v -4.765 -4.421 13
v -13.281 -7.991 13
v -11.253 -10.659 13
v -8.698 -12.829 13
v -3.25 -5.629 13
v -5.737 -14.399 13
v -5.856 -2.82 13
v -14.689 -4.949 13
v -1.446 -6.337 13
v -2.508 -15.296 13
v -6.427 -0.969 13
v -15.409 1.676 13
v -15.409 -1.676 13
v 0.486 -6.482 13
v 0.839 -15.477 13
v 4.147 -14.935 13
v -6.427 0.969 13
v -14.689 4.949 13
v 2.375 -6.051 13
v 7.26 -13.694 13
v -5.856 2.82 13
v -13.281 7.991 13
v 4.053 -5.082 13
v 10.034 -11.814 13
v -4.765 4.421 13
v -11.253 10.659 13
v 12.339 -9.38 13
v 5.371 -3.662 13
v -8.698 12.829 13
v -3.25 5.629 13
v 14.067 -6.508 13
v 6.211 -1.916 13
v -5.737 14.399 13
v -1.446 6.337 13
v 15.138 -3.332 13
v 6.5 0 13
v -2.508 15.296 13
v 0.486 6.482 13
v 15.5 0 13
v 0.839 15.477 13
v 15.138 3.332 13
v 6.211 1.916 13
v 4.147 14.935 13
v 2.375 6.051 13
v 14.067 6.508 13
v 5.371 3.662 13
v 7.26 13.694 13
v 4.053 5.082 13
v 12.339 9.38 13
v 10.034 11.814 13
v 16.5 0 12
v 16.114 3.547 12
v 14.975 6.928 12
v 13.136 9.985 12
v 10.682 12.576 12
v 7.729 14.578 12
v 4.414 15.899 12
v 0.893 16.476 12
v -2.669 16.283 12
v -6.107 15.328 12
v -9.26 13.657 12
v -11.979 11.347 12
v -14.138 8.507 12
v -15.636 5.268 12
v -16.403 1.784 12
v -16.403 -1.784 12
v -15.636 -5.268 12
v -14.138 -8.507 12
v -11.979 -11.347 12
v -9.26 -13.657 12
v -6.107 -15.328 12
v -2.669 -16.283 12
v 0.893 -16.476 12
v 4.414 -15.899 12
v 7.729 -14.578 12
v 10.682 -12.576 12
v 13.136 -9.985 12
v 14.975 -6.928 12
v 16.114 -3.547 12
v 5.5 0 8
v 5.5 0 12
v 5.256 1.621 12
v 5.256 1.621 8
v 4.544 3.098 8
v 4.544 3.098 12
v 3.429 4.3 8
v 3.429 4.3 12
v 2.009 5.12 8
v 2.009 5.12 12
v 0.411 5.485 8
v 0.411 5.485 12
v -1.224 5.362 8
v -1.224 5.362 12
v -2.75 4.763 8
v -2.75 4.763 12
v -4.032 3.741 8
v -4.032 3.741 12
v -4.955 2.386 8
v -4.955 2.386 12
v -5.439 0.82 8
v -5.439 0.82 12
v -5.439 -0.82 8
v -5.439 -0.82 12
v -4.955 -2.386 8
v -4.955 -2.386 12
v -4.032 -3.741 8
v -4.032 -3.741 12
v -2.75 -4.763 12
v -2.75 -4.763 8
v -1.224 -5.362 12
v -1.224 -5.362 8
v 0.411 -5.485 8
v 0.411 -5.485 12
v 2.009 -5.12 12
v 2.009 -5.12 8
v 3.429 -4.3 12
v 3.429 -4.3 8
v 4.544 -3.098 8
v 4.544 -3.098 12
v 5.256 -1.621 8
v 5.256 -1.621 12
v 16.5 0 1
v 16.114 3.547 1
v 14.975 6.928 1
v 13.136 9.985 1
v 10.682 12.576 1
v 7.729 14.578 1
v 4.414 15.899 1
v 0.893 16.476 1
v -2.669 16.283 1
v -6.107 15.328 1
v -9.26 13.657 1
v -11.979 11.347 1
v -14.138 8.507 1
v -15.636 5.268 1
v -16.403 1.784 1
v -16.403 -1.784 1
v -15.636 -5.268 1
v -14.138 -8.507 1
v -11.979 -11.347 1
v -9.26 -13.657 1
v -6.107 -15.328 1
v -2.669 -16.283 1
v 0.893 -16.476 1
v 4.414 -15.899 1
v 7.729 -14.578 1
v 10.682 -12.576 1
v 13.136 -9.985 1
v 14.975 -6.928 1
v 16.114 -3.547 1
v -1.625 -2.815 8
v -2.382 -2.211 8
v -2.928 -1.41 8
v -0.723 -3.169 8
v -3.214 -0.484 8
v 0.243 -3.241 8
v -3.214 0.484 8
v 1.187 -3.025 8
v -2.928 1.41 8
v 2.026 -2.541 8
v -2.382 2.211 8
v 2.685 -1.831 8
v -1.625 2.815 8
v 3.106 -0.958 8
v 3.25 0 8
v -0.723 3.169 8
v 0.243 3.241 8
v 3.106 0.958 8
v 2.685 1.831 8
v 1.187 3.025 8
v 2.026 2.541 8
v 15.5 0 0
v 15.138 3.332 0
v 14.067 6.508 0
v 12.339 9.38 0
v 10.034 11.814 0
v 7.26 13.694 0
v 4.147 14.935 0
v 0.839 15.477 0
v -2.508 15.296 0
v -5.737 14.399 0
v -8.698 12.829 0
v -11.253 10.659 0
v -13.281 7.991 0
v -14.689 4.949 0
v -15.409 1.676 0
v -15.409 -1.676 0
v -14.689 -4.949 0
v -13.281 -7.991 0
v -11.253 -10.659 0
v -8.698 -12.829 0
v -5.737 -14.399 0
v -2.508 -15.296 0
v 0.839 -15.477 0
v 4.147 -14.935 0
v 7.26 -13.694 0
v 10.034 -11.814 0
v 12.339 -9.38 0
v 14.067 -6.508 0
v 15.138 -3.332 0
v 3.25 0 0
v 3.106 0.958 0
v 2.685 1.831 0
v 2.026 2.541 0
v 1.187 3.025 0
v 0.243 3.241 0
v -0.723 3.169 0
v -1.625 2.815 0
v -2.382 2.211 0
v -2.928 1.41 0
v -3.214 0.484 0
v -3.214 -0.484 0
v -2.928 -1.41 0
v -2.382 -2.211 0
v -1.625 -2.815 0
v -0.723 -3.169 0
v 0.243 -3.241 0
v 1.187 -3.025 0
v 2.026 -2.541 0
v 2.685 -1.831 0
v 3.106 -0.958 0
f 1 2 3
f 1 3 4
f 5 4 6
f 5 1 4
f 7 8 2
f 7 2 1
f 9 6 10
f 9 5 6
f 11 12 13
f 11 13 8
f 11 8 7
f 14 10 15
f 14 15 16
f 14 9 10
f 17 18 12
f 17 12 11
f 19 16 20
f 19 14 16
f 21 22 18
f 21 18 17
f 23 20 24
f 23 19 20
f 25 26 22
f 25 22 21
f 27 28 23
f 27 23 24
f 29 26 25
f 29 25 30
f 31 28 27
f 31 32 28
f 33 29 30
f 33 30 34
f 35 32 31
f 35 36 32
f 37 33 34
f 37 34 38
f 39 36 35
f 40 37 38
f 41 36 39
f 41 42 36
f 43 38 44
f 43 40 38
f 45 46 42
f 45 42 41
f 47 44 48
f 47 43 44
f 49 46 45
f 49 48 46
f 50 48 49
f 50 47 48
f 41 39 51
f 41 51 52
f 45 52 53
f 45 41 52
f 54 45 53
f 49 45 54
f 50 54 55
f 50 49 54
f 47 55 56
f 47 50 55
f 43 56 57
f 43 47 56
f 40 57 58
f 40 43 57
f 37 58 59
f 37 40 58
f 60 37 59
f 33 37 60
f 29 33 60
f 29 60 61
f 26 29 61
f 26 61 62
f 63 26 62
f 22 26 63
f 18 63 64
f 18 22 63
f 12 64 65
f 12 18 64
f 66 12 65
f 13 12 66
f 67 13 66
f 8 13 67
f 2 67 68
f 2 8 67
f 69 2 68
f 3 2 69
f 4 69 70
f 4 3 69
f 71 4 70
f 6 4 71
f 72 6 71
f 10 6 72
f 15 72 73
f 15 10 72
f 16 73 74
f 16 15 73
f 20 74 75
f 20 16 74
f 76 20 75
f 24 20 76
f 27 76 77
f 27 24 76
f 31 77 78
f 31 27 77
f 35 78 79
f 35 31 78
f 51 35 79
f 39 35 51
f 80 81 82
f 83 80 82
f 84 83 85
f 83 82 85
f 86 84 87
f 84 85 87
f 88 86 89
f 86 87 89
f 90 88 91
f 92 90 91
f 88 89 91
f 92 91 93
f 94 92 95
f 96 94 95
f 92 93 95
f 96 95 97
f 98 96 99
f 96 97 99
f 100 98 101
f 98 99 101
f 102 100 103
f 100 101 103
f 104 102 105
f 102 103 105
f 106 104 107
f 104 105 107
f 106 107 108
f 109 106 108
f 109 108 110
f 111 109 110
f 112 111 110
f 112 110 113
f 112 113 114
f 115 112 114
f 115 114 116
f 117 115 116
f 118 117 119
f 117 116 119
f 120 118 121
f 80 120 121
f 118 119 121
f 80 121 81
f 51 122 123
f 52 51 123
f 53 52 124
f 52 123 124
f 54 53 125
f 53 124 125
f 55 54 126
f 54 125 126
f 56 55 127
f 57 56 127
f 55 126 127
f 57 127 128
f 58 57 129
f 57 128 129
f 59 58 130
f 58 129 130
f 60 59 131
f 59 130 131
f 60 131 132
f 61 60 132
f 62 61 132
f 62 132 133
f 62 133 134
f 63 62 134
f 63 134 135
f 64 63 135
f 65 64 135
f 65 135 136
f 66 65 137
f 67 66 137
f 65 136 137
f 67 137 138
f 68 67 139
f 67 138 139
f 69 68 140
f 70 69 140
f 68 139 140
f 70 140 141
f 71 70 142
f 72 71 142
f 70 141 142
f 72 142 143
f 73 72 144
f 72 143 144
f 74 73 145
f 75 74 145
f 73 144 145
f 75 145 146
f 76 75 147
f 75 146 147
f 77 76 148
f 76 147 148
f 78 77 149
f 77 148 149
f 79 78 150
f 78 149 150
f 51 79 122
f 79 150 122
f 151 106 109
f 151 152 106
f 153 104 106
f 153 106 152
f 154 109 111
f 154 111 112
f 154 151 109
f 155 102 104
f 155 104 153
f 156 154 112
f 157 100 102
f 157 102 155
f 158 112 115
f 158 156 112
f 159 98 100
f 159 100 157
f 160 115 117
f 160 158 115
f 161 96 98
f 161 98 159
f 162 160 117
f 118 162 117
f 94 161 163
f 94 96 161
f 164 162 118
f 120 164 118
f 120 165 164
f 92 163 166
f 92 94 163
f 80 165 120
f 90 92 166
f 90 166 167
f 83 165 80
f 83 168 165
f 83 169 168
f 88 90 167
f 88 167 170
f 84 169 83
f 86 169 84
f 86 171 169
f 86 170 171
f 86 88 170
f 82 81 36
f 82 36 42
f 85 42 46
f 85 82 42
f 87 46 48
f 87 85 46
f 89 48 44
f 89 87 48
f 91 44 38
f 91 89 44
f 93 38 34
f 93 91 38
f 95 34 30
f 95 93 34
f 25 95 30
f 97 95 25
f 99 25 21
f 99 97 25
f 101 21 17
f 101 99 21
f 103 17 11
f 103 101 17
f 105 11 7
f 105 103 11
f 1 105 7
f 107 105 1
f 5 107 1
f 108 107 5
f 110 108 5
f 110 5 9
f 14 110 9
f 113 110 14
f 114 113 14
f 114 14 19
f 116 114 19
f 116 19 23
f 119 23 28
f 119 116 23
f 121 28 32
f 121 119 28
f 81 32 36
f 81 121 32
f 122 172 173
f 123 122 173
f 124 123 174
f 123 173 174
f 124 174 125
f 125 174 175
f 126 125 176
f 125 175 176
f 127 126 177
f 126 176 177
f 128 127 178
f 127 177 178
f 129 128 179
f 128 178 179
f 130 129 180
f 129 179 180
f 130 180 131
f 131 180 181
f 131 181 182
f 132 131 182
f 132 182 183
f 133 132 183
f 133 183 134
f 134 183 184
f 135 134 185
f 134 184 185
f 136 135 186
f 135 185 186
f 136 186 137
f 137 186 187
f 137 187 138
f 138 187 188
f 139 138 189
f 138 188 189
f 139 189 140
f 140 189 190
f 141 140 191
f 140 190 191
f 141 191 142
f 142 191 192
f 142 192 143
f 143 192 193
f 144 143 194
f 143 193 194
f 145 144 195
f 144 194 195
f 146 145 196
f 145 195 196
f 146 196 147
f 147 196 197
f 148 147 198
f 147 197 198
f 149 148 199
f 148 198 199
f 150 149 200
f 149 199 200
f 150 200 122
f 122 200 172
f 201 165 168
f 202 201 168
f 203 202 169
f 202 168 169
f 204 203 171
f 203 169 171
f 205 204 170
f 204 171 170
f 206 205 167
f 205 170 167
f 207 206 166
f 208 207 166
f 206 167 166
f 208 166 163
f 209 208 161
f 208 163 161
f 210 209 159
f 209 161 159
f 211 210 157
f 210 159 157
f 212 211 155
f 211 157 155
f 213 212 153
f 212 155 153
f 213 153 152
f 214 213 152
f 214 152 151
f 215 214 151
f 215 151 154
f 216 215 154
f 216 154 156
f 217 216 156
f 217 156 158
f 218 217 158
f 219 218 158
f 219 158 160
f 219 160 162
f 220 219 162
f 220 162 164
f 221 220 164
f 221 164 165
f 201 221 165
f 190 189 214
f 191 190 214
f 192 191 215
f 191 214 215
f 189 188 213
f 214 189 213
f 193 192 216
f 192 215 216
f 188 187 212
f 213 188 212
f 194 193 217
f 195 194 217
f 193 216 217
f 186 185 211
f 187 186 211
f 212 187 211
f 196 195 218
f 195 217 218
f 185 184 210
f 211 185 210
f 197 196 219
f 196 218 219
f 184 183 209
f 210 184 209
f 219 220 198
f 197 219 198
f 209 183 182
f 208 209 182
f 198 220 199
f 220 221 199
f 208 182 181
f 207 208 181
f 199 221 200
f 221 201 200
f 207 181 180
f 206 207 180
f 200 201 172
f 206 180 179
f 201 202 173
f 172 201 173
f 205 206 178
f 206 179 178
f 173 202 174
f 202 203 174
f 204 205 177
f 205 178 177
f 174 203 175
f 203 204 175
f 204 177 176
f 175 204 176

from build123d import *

# Parameters (mm, degrees)
SKETCH_R        = 16.5
PAD_DEPTH       = 13
SKETCH002_R     = 3.25
POCKET_DEPTH    = 13.001
SKETCH001_R     = 5.5
POCKET001_DEPTH = 5
CHAMFER_SIZE    = 1
CHAMFER001_SIZE = 1
CHAMFER002_SIZE = 1


with BuildPart() as part:
    # Sketch → Pad (new body)
    with BuildSketch(Plane.XY):
        Circle(SKETCH_R)
    extrude(amount=PAD_DEPTH)

    # Sketch002 (on Face3 of Pad) → Pocket (cut, through all)
    with BuildSketch(Plane.XY.offset(13)):
        Circle(SKETCH002_R)
    extrude(amount=-POCKET_DEPTH, mode=Mode.SUBTRACT)

    # Sketch001 (on Face3 of Pad) → Pocket001 (cut)
    with BuildSketch(Plane.XY.offset(13)):
        Circle(SKETCH001_R)
    extrude(amount=-POCKET001_DEPTH, mode=Mode.SUBTRACT)

    # Chamfer
    chamfer_edges = [part.edges().sort_by_distance(p)[0] for p in [
        (-16.5, 0, 0),
    ]]
    chamfer(chamfer_edges, length=CHAMFER_SIZE)

    # Chamfer001
    chamfer001_edges = [part.edges().sort_by_distance(p)[0] for p in [
        (-16.5, 0, 13),
    ]]
    chamfer(chamfer001_edges, length=CHAMFER001_SIZE)

    # Chamfer002
    chamfer002_edges = [part.edges().sort_by_distance(p)[0] for p in [
        (-5.5, 0, 13),
    ]]
    chamfer(chamfer002_edges, length=CHAMFER002_SIZE)


solid = part.part
